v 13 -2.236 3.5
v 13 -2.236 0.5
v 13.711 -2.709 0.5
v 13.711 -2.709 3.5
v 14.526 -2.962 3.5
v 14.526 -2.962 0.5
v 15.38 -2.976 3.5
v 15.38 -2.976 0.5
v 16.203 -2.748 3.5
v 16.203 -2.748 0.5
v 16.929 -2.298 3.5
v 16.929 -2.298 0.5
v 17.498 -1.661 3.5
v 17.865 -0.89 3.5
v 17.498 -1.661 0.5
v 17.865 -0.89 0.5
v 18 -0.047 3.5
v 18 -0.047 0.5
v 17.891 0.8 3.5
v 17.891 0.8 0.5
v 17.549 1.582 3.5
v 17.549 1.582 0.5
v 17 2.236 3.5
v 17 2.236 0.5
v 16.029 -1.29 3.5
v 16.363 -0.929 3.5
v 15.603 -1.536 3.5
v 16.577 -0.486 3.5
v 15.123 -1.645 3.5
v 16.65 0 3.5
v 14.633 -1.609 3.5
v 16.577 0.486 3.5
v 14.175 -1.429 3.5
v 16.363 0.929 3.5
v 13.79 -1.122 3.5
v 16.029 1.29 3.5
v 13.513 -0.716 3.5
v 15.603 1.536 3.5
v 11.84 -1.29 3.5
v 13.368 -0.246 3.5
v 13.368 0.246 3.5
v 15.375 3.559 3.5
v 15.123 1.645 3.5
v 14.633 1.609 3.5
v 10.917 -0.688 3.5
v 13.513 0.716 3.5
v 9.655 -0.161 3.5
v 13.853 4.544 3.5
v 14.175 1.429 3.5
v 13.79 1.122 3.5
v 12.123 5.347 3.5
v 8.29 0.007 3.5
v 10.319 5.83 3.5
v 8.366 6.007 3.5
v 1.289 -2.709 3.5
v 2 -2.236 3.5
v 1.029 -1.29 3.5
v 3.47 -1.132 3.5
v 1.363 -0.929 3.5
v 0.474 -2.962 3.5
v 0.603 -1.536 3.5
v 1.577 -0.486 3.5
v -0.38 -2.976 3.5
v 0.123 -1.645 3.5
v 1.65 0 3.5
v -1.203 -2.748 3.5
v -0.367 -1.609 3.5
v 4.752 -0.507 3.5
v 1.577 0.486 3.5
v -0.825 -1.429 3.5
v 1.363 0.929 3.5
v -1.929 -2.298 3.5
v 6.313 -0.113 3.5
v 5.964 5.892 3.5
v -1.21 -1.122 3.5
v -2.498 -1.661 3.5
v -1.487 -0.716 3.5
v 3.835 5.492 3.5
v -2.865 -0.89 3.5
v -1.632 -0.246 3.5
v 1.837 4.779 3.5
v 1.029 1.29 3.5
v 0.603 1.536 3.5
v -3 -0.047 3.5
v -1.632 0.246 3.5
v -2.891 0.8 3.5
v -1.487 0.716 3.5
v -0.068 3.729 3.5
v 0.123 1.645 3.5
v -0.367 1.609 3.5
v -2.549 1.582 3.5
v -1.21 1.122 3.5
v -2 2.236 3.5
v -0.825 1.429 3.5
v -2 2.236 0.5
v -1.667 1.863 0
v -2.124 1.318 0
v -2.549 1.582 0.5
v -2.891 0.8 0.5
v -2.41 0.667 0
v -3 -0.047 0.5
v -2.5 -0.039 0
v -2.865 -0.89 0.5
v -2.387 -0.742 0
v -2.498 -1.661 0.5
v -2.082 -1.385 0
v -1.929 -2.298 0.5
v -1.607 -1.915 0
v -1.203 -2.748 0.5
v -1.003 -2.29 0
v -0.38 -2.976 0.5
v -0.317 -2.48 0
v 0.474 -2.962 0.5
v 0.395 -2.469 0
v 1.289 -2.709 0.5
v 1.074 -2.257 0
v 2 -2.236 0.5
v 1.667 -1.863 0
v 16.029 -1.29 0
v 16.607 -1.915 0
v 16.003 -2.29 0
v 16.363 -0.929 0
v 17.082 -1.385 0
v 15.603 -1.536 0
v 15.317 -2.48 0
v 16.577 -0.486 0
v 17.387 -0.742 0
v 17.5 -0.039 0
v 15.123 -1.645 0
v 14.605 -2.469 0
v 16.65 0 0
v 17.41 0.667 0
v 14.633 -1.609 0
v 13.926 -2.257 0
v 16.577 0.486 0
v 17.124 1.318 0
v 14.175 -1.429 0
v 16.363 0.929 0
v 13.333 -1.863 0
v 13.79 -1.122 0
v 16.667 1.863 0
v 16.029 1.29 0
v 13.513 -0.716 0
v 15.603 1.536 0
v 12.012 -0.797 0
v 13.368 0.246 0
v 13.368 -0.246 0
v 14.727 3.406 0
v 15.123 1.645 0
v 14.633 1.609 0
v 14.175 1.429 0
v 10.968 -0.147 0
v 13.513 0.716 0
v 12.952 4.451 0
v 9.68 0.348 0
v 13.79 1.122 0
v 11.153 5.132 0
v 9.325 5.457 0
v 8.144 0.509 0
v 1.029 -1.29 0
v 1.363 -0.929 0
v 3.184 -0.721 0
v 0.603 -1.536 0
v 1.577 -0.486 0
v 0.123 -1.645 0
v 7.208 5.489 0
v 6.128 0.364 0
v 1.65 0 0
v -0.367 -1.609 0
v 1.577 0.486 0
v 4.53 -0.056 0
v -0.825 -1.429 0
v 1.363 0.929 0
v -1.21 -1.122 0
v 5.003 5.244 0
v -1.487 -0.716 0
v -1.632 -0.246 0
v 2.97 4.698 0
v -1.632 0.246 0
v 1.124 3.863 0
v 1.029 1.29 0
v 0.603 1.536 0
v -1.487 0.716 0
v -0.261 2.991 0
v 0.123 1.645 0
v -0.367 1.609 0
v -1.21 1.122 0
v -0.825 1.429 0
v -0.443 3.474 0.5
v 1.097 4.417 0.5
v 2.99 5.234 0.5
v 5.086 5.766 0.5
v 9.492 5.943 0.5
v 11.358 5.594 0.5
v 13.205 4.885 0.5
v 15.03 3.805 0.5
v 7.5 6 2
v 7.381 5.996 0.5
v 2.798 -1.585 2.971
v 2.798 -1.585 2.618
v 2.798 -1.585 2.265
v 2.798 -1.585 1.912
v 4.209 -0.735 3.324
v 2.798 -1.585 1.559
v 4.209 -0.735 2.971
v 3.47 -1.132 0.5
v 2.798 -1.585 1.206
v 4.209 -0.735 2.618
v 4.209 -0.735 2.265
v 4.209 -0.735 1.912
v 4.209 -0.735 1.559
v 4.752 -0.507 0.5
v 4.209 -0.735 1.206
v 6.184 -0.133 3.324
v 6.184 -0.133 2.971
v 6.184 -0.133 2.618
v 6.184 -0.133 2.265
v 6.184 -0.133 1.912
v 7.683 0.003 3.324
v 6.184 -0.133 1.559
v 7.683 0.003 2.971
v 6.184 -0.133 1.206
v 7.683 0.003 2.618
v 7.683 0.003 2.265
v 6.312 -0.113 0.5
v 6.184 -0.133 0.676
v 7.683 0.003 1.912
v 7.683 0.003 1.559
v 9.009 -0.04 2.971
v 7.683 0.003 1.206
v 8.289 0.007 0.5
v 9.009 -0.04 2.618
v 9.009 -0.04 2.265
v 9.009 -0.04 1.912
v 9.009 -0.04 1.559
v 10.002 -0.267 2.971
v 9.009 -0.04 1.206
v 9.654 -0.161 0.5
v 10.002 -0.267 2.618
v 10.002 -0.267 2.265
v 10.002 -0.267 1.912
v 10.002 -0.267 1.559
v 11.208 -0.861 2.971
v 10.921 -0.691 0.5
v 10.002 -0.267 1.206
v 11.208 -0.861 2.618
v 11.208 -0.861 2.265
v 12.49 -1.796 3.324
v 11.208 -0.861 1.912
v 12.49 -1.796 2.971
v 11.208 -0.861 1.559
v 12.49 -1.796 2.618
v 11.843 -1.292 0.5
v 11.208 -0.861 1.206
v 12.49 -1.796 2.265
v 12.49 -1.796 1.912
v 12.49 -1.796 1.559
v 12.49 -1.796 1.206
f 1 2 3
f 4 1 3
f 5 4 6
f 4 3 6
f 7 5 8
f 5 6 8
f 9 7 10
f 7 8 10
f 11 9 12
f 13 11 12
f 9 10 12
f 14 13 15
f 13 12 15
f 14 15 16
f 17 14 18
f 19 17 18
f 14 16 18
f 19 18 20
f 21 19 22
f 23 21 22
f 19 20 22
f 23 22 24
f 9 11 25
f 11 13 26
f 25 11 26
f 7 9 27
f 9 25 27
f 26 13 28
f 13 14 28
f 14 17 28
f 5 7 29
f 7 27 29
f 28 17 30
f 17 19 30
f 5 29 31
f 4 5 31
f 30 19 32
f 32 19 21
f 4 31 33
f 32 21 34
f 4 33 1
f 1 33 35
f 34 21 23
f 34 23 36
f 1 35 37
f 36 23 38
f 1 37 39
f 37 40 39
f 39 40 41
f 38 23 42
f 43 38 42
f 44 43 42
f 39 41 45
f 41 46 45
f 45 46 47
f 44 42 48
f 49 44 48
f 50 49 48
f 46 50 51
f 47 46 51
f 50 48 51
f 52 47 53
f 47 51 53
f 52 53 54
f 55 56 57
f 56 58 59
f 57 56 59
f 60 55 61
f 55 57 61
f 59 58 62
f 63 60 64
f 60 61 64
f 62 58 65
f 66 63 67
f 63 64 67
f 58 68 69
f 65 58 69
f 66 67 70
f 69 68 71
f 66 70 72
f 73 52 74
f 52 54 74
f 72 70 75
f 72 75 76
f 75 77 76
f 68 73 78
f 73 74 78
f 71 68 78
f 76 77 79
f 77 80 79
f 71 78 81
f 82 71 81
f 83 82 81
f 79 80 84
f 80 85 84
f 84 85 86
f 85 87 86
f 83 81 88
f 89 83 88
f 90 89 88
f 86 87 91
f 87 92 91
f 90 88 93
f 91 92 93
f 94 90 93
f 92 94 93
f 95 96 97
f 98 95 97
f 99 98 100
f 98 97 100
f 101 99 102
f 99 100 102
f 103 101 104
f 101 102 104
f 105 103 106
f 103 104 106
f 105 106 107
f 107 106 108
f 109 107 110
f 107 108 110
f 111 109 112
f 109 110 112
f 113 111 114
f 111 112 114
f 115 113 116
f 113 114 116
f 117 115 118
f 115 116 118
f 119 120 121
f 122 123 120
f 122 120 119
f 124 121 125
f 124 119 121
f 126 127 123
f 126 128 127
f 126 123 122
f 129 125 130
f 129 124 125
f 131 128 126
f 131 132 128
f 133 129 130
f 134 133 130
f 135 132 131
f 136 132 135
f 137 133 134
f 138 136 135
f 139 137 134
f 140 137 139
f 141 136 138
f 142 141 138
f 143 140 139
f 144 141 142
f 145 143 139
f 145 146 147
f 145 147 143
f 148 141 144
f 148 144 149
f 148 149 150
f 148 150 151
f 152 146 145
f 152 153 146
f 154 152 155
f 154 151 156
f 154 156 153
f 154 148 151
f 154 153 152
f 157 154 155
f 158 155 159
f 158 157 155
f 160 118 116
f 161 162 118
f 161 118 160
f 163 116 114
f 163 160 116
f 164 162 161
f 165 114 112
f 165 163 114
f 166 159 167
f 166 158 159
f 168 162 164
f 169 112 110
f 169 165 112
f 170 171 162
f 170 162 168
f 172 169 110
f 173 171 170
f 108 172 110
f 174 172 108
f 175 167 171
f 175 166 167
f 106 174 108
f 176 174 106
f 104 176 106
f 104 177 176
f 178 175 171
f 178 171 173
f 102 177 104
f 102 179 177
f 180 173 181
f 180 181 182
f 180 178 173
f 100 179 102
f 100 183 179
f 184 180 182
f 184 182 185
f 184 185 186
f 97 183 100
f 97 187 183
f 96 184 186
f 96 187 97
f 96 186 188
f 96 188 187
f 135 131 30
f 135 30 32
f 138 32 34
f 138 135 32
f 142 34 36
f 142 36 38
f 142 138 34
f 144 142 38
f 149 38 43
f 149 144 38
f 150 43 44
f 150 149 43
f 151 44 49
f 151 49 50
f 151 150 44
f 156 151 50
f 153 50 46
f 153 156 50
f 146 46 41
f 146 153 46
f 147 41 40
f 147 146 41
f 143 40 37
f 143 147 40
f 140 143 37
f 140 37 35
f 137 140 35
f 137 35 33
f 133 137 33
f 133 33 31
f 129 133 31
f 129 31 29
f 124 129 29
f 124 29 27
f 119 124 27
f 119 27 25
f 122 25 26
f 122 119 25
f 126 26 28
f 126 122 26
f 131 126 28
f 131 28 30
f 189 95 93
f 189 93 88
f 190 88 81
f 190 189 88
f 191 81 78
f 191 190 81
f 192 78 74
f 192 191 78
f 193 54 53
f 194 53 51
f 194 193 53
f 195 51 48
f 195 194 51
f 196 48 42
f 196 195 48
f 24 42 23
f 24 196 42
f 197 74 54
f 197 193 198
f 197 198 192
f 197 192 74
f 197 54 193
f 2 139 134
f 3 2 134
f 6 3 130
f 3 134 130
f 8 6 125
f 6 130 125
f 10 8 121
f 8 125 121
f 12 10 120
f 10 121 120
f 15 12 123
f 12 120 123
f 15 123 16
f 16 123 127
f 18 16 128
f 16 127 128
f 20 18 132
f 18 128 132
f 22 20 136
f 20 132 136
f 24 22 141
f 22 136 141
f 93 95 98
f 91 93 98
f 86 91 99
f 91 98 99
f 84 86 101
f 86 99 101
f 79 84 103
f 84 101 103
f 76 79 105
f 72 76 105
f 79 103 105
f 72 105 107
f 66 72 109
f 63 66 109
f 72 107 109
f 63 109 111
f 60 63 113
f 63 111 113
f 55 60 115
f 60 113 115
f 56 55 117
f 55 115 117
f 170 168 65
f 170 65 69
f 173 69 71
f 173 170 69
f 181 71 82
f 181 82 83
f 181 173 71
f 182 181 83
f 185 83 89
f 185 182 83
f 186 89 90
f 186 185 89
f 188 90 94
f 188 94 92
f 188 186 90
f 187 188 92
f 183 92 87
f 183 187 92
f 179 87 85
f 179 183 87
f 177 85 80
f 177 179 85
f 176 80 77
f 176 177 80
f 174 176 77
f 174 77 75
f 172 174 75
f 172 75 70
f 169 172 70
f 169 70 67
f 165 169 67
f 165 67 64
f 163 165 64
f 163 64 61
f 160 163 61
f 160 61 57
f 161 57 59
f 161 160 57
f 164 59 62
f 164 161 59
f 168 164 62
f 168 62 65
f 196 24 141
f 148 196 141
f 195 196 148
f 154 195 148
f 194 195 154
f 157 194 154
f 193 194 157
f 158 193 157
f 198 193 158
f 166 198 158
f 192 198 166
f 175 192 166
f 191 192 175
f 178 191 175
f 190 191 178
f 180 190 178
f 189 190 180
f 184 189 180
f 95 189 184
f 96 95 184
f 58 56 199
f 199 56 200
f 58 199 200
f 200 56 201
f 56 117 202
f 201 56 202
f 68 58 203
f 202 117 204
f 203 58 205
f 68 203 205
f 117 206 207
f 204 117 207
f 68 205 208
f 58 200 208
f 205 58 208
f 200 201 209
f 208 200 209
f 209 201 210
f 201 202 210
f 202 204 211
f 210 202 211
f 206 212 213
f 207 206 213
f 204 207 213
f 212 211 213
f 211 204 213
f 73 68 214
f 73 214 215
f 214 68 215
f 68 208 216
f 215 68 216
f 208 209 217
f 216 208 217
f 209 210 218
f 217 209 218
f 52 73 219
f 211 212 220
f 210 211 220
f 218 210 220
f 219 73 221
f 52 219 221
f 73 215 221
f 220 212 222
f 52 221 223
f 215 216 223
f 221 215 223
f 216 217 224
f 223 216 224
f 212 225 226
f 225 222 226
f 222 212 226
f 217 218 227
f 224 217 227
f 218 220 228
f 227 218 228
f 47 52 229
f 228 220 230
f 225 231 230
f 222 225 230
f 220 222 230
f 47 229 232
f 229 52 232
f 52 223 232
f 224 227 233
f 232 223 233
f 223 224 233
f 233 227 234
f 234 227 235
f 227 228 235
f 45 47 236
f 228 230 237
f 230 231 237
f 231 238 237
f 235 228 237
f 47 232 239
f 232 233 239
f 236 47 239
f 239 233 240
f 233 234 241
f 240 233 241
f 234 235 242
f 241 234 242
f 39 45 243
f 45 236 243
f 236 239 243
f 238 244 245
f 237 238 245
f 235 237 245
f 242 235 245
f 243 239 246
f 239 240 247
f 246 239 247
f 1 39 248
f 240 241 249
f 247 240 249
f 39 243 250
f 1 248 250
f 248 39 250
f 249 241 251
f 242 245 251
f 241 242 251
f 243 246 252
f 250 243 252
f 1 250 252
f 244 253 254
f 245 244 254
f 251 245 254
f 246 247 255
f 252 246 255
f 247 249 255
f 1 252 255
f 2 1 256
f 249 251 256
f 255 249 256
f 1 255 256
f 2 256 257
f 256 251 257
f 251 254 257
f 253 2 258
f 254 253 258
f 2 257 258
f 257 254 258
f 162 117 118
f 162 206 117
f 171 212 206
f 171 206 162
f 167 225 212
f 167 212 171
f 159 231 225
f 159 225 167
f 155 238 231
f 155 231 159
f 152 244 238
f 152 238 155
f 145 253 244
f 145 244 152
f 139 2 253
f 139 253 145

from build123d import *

# Parameters (mm, degrees)
SKETCH_1_R      = 1.65
EXTRUDE_2_DEPTH = 3.5
CHAMFER_1_SIZE  = 0.5


with BuildPart() as part:
    # 草图1 → 凸台-拉伸2 (new body)
    with BuildSketch(Plane.XY):
        with BuildLine():
            add(Edge.make_bspline(
                [(-2, 2.236067977), (1.298350605, 5.186202444), (7.70496537, 6.630470955), (13.291718654, 5.552855645), (17, 2.236067977)],
                knots=[0, 0, 0, 0, 0.5, 1, 1, 1, 1], degree=3))
            ThreePointArc((-2, 2.236067977), (-2.236067977, -2), (2, -2.236067977))
            add(Edge.make_bspline(
                [(2, -2.236067977), (2.133231621, -2.116901993), (2.413155894, -1.87779666), (2.92891001, -1.478504787), (3.538329614, -1.07495841), (4.2139596, -0.719034821), (5.07558679, -0.368617139), (5.940240482, -0.155045102), (6.888643765, -0.035603913), (7.691648693, 0.010168459), (8.44481537, 0.011741207), (9.02314593, -0.033114067), (9.5178697, -0.118274629), (9.991466761, -0.252962594), (10.526142012, -0.471507355), (11.180937128, -0.827124358), (11.86067581, -1.292530825), (12.478348447, -1.781196), (12.832651532, -2.086386958), (13, -2.236067977)],
                knots=[0, 0, 0, 0, 0.03125, 0.0625, 0.125, 0.1875, 0.25, 0.375, 0.4375, 0.5, 0.5625, 0.625, 0.6875, 0.75, 0.8125, 0.875, 0.9375, 0.96875, 1, 1, 1, 1], degree=3))
            ThreePointArc((13, -2.236067977), (17.236067977, -2), (17, 2.236067977))
        make_face()
        Circle(SKETCH_1_R, mode=Mode.SUBTRACT)
        with Locations((15, 0)):
            Circle(SKETCH_1_R, mode=Mode.SUBTRACT)
    extrude(amount=EXTRUDE_2_DEPTH)

    # 倒角1
    chamfer_1_edges = [part.edges().sort_by_distance(p)[0] for p in [
        (17.236067977, -2, 0),
        (7.532671852, -0.002579069, 0),
        (-2.236067977, -2, 0),
        (7.532671852, -0.002579069, 0),
    ]]
    chamfer(chamfer_1_edges, length=CHAMFER_1_SIZE)


solid = part.part
